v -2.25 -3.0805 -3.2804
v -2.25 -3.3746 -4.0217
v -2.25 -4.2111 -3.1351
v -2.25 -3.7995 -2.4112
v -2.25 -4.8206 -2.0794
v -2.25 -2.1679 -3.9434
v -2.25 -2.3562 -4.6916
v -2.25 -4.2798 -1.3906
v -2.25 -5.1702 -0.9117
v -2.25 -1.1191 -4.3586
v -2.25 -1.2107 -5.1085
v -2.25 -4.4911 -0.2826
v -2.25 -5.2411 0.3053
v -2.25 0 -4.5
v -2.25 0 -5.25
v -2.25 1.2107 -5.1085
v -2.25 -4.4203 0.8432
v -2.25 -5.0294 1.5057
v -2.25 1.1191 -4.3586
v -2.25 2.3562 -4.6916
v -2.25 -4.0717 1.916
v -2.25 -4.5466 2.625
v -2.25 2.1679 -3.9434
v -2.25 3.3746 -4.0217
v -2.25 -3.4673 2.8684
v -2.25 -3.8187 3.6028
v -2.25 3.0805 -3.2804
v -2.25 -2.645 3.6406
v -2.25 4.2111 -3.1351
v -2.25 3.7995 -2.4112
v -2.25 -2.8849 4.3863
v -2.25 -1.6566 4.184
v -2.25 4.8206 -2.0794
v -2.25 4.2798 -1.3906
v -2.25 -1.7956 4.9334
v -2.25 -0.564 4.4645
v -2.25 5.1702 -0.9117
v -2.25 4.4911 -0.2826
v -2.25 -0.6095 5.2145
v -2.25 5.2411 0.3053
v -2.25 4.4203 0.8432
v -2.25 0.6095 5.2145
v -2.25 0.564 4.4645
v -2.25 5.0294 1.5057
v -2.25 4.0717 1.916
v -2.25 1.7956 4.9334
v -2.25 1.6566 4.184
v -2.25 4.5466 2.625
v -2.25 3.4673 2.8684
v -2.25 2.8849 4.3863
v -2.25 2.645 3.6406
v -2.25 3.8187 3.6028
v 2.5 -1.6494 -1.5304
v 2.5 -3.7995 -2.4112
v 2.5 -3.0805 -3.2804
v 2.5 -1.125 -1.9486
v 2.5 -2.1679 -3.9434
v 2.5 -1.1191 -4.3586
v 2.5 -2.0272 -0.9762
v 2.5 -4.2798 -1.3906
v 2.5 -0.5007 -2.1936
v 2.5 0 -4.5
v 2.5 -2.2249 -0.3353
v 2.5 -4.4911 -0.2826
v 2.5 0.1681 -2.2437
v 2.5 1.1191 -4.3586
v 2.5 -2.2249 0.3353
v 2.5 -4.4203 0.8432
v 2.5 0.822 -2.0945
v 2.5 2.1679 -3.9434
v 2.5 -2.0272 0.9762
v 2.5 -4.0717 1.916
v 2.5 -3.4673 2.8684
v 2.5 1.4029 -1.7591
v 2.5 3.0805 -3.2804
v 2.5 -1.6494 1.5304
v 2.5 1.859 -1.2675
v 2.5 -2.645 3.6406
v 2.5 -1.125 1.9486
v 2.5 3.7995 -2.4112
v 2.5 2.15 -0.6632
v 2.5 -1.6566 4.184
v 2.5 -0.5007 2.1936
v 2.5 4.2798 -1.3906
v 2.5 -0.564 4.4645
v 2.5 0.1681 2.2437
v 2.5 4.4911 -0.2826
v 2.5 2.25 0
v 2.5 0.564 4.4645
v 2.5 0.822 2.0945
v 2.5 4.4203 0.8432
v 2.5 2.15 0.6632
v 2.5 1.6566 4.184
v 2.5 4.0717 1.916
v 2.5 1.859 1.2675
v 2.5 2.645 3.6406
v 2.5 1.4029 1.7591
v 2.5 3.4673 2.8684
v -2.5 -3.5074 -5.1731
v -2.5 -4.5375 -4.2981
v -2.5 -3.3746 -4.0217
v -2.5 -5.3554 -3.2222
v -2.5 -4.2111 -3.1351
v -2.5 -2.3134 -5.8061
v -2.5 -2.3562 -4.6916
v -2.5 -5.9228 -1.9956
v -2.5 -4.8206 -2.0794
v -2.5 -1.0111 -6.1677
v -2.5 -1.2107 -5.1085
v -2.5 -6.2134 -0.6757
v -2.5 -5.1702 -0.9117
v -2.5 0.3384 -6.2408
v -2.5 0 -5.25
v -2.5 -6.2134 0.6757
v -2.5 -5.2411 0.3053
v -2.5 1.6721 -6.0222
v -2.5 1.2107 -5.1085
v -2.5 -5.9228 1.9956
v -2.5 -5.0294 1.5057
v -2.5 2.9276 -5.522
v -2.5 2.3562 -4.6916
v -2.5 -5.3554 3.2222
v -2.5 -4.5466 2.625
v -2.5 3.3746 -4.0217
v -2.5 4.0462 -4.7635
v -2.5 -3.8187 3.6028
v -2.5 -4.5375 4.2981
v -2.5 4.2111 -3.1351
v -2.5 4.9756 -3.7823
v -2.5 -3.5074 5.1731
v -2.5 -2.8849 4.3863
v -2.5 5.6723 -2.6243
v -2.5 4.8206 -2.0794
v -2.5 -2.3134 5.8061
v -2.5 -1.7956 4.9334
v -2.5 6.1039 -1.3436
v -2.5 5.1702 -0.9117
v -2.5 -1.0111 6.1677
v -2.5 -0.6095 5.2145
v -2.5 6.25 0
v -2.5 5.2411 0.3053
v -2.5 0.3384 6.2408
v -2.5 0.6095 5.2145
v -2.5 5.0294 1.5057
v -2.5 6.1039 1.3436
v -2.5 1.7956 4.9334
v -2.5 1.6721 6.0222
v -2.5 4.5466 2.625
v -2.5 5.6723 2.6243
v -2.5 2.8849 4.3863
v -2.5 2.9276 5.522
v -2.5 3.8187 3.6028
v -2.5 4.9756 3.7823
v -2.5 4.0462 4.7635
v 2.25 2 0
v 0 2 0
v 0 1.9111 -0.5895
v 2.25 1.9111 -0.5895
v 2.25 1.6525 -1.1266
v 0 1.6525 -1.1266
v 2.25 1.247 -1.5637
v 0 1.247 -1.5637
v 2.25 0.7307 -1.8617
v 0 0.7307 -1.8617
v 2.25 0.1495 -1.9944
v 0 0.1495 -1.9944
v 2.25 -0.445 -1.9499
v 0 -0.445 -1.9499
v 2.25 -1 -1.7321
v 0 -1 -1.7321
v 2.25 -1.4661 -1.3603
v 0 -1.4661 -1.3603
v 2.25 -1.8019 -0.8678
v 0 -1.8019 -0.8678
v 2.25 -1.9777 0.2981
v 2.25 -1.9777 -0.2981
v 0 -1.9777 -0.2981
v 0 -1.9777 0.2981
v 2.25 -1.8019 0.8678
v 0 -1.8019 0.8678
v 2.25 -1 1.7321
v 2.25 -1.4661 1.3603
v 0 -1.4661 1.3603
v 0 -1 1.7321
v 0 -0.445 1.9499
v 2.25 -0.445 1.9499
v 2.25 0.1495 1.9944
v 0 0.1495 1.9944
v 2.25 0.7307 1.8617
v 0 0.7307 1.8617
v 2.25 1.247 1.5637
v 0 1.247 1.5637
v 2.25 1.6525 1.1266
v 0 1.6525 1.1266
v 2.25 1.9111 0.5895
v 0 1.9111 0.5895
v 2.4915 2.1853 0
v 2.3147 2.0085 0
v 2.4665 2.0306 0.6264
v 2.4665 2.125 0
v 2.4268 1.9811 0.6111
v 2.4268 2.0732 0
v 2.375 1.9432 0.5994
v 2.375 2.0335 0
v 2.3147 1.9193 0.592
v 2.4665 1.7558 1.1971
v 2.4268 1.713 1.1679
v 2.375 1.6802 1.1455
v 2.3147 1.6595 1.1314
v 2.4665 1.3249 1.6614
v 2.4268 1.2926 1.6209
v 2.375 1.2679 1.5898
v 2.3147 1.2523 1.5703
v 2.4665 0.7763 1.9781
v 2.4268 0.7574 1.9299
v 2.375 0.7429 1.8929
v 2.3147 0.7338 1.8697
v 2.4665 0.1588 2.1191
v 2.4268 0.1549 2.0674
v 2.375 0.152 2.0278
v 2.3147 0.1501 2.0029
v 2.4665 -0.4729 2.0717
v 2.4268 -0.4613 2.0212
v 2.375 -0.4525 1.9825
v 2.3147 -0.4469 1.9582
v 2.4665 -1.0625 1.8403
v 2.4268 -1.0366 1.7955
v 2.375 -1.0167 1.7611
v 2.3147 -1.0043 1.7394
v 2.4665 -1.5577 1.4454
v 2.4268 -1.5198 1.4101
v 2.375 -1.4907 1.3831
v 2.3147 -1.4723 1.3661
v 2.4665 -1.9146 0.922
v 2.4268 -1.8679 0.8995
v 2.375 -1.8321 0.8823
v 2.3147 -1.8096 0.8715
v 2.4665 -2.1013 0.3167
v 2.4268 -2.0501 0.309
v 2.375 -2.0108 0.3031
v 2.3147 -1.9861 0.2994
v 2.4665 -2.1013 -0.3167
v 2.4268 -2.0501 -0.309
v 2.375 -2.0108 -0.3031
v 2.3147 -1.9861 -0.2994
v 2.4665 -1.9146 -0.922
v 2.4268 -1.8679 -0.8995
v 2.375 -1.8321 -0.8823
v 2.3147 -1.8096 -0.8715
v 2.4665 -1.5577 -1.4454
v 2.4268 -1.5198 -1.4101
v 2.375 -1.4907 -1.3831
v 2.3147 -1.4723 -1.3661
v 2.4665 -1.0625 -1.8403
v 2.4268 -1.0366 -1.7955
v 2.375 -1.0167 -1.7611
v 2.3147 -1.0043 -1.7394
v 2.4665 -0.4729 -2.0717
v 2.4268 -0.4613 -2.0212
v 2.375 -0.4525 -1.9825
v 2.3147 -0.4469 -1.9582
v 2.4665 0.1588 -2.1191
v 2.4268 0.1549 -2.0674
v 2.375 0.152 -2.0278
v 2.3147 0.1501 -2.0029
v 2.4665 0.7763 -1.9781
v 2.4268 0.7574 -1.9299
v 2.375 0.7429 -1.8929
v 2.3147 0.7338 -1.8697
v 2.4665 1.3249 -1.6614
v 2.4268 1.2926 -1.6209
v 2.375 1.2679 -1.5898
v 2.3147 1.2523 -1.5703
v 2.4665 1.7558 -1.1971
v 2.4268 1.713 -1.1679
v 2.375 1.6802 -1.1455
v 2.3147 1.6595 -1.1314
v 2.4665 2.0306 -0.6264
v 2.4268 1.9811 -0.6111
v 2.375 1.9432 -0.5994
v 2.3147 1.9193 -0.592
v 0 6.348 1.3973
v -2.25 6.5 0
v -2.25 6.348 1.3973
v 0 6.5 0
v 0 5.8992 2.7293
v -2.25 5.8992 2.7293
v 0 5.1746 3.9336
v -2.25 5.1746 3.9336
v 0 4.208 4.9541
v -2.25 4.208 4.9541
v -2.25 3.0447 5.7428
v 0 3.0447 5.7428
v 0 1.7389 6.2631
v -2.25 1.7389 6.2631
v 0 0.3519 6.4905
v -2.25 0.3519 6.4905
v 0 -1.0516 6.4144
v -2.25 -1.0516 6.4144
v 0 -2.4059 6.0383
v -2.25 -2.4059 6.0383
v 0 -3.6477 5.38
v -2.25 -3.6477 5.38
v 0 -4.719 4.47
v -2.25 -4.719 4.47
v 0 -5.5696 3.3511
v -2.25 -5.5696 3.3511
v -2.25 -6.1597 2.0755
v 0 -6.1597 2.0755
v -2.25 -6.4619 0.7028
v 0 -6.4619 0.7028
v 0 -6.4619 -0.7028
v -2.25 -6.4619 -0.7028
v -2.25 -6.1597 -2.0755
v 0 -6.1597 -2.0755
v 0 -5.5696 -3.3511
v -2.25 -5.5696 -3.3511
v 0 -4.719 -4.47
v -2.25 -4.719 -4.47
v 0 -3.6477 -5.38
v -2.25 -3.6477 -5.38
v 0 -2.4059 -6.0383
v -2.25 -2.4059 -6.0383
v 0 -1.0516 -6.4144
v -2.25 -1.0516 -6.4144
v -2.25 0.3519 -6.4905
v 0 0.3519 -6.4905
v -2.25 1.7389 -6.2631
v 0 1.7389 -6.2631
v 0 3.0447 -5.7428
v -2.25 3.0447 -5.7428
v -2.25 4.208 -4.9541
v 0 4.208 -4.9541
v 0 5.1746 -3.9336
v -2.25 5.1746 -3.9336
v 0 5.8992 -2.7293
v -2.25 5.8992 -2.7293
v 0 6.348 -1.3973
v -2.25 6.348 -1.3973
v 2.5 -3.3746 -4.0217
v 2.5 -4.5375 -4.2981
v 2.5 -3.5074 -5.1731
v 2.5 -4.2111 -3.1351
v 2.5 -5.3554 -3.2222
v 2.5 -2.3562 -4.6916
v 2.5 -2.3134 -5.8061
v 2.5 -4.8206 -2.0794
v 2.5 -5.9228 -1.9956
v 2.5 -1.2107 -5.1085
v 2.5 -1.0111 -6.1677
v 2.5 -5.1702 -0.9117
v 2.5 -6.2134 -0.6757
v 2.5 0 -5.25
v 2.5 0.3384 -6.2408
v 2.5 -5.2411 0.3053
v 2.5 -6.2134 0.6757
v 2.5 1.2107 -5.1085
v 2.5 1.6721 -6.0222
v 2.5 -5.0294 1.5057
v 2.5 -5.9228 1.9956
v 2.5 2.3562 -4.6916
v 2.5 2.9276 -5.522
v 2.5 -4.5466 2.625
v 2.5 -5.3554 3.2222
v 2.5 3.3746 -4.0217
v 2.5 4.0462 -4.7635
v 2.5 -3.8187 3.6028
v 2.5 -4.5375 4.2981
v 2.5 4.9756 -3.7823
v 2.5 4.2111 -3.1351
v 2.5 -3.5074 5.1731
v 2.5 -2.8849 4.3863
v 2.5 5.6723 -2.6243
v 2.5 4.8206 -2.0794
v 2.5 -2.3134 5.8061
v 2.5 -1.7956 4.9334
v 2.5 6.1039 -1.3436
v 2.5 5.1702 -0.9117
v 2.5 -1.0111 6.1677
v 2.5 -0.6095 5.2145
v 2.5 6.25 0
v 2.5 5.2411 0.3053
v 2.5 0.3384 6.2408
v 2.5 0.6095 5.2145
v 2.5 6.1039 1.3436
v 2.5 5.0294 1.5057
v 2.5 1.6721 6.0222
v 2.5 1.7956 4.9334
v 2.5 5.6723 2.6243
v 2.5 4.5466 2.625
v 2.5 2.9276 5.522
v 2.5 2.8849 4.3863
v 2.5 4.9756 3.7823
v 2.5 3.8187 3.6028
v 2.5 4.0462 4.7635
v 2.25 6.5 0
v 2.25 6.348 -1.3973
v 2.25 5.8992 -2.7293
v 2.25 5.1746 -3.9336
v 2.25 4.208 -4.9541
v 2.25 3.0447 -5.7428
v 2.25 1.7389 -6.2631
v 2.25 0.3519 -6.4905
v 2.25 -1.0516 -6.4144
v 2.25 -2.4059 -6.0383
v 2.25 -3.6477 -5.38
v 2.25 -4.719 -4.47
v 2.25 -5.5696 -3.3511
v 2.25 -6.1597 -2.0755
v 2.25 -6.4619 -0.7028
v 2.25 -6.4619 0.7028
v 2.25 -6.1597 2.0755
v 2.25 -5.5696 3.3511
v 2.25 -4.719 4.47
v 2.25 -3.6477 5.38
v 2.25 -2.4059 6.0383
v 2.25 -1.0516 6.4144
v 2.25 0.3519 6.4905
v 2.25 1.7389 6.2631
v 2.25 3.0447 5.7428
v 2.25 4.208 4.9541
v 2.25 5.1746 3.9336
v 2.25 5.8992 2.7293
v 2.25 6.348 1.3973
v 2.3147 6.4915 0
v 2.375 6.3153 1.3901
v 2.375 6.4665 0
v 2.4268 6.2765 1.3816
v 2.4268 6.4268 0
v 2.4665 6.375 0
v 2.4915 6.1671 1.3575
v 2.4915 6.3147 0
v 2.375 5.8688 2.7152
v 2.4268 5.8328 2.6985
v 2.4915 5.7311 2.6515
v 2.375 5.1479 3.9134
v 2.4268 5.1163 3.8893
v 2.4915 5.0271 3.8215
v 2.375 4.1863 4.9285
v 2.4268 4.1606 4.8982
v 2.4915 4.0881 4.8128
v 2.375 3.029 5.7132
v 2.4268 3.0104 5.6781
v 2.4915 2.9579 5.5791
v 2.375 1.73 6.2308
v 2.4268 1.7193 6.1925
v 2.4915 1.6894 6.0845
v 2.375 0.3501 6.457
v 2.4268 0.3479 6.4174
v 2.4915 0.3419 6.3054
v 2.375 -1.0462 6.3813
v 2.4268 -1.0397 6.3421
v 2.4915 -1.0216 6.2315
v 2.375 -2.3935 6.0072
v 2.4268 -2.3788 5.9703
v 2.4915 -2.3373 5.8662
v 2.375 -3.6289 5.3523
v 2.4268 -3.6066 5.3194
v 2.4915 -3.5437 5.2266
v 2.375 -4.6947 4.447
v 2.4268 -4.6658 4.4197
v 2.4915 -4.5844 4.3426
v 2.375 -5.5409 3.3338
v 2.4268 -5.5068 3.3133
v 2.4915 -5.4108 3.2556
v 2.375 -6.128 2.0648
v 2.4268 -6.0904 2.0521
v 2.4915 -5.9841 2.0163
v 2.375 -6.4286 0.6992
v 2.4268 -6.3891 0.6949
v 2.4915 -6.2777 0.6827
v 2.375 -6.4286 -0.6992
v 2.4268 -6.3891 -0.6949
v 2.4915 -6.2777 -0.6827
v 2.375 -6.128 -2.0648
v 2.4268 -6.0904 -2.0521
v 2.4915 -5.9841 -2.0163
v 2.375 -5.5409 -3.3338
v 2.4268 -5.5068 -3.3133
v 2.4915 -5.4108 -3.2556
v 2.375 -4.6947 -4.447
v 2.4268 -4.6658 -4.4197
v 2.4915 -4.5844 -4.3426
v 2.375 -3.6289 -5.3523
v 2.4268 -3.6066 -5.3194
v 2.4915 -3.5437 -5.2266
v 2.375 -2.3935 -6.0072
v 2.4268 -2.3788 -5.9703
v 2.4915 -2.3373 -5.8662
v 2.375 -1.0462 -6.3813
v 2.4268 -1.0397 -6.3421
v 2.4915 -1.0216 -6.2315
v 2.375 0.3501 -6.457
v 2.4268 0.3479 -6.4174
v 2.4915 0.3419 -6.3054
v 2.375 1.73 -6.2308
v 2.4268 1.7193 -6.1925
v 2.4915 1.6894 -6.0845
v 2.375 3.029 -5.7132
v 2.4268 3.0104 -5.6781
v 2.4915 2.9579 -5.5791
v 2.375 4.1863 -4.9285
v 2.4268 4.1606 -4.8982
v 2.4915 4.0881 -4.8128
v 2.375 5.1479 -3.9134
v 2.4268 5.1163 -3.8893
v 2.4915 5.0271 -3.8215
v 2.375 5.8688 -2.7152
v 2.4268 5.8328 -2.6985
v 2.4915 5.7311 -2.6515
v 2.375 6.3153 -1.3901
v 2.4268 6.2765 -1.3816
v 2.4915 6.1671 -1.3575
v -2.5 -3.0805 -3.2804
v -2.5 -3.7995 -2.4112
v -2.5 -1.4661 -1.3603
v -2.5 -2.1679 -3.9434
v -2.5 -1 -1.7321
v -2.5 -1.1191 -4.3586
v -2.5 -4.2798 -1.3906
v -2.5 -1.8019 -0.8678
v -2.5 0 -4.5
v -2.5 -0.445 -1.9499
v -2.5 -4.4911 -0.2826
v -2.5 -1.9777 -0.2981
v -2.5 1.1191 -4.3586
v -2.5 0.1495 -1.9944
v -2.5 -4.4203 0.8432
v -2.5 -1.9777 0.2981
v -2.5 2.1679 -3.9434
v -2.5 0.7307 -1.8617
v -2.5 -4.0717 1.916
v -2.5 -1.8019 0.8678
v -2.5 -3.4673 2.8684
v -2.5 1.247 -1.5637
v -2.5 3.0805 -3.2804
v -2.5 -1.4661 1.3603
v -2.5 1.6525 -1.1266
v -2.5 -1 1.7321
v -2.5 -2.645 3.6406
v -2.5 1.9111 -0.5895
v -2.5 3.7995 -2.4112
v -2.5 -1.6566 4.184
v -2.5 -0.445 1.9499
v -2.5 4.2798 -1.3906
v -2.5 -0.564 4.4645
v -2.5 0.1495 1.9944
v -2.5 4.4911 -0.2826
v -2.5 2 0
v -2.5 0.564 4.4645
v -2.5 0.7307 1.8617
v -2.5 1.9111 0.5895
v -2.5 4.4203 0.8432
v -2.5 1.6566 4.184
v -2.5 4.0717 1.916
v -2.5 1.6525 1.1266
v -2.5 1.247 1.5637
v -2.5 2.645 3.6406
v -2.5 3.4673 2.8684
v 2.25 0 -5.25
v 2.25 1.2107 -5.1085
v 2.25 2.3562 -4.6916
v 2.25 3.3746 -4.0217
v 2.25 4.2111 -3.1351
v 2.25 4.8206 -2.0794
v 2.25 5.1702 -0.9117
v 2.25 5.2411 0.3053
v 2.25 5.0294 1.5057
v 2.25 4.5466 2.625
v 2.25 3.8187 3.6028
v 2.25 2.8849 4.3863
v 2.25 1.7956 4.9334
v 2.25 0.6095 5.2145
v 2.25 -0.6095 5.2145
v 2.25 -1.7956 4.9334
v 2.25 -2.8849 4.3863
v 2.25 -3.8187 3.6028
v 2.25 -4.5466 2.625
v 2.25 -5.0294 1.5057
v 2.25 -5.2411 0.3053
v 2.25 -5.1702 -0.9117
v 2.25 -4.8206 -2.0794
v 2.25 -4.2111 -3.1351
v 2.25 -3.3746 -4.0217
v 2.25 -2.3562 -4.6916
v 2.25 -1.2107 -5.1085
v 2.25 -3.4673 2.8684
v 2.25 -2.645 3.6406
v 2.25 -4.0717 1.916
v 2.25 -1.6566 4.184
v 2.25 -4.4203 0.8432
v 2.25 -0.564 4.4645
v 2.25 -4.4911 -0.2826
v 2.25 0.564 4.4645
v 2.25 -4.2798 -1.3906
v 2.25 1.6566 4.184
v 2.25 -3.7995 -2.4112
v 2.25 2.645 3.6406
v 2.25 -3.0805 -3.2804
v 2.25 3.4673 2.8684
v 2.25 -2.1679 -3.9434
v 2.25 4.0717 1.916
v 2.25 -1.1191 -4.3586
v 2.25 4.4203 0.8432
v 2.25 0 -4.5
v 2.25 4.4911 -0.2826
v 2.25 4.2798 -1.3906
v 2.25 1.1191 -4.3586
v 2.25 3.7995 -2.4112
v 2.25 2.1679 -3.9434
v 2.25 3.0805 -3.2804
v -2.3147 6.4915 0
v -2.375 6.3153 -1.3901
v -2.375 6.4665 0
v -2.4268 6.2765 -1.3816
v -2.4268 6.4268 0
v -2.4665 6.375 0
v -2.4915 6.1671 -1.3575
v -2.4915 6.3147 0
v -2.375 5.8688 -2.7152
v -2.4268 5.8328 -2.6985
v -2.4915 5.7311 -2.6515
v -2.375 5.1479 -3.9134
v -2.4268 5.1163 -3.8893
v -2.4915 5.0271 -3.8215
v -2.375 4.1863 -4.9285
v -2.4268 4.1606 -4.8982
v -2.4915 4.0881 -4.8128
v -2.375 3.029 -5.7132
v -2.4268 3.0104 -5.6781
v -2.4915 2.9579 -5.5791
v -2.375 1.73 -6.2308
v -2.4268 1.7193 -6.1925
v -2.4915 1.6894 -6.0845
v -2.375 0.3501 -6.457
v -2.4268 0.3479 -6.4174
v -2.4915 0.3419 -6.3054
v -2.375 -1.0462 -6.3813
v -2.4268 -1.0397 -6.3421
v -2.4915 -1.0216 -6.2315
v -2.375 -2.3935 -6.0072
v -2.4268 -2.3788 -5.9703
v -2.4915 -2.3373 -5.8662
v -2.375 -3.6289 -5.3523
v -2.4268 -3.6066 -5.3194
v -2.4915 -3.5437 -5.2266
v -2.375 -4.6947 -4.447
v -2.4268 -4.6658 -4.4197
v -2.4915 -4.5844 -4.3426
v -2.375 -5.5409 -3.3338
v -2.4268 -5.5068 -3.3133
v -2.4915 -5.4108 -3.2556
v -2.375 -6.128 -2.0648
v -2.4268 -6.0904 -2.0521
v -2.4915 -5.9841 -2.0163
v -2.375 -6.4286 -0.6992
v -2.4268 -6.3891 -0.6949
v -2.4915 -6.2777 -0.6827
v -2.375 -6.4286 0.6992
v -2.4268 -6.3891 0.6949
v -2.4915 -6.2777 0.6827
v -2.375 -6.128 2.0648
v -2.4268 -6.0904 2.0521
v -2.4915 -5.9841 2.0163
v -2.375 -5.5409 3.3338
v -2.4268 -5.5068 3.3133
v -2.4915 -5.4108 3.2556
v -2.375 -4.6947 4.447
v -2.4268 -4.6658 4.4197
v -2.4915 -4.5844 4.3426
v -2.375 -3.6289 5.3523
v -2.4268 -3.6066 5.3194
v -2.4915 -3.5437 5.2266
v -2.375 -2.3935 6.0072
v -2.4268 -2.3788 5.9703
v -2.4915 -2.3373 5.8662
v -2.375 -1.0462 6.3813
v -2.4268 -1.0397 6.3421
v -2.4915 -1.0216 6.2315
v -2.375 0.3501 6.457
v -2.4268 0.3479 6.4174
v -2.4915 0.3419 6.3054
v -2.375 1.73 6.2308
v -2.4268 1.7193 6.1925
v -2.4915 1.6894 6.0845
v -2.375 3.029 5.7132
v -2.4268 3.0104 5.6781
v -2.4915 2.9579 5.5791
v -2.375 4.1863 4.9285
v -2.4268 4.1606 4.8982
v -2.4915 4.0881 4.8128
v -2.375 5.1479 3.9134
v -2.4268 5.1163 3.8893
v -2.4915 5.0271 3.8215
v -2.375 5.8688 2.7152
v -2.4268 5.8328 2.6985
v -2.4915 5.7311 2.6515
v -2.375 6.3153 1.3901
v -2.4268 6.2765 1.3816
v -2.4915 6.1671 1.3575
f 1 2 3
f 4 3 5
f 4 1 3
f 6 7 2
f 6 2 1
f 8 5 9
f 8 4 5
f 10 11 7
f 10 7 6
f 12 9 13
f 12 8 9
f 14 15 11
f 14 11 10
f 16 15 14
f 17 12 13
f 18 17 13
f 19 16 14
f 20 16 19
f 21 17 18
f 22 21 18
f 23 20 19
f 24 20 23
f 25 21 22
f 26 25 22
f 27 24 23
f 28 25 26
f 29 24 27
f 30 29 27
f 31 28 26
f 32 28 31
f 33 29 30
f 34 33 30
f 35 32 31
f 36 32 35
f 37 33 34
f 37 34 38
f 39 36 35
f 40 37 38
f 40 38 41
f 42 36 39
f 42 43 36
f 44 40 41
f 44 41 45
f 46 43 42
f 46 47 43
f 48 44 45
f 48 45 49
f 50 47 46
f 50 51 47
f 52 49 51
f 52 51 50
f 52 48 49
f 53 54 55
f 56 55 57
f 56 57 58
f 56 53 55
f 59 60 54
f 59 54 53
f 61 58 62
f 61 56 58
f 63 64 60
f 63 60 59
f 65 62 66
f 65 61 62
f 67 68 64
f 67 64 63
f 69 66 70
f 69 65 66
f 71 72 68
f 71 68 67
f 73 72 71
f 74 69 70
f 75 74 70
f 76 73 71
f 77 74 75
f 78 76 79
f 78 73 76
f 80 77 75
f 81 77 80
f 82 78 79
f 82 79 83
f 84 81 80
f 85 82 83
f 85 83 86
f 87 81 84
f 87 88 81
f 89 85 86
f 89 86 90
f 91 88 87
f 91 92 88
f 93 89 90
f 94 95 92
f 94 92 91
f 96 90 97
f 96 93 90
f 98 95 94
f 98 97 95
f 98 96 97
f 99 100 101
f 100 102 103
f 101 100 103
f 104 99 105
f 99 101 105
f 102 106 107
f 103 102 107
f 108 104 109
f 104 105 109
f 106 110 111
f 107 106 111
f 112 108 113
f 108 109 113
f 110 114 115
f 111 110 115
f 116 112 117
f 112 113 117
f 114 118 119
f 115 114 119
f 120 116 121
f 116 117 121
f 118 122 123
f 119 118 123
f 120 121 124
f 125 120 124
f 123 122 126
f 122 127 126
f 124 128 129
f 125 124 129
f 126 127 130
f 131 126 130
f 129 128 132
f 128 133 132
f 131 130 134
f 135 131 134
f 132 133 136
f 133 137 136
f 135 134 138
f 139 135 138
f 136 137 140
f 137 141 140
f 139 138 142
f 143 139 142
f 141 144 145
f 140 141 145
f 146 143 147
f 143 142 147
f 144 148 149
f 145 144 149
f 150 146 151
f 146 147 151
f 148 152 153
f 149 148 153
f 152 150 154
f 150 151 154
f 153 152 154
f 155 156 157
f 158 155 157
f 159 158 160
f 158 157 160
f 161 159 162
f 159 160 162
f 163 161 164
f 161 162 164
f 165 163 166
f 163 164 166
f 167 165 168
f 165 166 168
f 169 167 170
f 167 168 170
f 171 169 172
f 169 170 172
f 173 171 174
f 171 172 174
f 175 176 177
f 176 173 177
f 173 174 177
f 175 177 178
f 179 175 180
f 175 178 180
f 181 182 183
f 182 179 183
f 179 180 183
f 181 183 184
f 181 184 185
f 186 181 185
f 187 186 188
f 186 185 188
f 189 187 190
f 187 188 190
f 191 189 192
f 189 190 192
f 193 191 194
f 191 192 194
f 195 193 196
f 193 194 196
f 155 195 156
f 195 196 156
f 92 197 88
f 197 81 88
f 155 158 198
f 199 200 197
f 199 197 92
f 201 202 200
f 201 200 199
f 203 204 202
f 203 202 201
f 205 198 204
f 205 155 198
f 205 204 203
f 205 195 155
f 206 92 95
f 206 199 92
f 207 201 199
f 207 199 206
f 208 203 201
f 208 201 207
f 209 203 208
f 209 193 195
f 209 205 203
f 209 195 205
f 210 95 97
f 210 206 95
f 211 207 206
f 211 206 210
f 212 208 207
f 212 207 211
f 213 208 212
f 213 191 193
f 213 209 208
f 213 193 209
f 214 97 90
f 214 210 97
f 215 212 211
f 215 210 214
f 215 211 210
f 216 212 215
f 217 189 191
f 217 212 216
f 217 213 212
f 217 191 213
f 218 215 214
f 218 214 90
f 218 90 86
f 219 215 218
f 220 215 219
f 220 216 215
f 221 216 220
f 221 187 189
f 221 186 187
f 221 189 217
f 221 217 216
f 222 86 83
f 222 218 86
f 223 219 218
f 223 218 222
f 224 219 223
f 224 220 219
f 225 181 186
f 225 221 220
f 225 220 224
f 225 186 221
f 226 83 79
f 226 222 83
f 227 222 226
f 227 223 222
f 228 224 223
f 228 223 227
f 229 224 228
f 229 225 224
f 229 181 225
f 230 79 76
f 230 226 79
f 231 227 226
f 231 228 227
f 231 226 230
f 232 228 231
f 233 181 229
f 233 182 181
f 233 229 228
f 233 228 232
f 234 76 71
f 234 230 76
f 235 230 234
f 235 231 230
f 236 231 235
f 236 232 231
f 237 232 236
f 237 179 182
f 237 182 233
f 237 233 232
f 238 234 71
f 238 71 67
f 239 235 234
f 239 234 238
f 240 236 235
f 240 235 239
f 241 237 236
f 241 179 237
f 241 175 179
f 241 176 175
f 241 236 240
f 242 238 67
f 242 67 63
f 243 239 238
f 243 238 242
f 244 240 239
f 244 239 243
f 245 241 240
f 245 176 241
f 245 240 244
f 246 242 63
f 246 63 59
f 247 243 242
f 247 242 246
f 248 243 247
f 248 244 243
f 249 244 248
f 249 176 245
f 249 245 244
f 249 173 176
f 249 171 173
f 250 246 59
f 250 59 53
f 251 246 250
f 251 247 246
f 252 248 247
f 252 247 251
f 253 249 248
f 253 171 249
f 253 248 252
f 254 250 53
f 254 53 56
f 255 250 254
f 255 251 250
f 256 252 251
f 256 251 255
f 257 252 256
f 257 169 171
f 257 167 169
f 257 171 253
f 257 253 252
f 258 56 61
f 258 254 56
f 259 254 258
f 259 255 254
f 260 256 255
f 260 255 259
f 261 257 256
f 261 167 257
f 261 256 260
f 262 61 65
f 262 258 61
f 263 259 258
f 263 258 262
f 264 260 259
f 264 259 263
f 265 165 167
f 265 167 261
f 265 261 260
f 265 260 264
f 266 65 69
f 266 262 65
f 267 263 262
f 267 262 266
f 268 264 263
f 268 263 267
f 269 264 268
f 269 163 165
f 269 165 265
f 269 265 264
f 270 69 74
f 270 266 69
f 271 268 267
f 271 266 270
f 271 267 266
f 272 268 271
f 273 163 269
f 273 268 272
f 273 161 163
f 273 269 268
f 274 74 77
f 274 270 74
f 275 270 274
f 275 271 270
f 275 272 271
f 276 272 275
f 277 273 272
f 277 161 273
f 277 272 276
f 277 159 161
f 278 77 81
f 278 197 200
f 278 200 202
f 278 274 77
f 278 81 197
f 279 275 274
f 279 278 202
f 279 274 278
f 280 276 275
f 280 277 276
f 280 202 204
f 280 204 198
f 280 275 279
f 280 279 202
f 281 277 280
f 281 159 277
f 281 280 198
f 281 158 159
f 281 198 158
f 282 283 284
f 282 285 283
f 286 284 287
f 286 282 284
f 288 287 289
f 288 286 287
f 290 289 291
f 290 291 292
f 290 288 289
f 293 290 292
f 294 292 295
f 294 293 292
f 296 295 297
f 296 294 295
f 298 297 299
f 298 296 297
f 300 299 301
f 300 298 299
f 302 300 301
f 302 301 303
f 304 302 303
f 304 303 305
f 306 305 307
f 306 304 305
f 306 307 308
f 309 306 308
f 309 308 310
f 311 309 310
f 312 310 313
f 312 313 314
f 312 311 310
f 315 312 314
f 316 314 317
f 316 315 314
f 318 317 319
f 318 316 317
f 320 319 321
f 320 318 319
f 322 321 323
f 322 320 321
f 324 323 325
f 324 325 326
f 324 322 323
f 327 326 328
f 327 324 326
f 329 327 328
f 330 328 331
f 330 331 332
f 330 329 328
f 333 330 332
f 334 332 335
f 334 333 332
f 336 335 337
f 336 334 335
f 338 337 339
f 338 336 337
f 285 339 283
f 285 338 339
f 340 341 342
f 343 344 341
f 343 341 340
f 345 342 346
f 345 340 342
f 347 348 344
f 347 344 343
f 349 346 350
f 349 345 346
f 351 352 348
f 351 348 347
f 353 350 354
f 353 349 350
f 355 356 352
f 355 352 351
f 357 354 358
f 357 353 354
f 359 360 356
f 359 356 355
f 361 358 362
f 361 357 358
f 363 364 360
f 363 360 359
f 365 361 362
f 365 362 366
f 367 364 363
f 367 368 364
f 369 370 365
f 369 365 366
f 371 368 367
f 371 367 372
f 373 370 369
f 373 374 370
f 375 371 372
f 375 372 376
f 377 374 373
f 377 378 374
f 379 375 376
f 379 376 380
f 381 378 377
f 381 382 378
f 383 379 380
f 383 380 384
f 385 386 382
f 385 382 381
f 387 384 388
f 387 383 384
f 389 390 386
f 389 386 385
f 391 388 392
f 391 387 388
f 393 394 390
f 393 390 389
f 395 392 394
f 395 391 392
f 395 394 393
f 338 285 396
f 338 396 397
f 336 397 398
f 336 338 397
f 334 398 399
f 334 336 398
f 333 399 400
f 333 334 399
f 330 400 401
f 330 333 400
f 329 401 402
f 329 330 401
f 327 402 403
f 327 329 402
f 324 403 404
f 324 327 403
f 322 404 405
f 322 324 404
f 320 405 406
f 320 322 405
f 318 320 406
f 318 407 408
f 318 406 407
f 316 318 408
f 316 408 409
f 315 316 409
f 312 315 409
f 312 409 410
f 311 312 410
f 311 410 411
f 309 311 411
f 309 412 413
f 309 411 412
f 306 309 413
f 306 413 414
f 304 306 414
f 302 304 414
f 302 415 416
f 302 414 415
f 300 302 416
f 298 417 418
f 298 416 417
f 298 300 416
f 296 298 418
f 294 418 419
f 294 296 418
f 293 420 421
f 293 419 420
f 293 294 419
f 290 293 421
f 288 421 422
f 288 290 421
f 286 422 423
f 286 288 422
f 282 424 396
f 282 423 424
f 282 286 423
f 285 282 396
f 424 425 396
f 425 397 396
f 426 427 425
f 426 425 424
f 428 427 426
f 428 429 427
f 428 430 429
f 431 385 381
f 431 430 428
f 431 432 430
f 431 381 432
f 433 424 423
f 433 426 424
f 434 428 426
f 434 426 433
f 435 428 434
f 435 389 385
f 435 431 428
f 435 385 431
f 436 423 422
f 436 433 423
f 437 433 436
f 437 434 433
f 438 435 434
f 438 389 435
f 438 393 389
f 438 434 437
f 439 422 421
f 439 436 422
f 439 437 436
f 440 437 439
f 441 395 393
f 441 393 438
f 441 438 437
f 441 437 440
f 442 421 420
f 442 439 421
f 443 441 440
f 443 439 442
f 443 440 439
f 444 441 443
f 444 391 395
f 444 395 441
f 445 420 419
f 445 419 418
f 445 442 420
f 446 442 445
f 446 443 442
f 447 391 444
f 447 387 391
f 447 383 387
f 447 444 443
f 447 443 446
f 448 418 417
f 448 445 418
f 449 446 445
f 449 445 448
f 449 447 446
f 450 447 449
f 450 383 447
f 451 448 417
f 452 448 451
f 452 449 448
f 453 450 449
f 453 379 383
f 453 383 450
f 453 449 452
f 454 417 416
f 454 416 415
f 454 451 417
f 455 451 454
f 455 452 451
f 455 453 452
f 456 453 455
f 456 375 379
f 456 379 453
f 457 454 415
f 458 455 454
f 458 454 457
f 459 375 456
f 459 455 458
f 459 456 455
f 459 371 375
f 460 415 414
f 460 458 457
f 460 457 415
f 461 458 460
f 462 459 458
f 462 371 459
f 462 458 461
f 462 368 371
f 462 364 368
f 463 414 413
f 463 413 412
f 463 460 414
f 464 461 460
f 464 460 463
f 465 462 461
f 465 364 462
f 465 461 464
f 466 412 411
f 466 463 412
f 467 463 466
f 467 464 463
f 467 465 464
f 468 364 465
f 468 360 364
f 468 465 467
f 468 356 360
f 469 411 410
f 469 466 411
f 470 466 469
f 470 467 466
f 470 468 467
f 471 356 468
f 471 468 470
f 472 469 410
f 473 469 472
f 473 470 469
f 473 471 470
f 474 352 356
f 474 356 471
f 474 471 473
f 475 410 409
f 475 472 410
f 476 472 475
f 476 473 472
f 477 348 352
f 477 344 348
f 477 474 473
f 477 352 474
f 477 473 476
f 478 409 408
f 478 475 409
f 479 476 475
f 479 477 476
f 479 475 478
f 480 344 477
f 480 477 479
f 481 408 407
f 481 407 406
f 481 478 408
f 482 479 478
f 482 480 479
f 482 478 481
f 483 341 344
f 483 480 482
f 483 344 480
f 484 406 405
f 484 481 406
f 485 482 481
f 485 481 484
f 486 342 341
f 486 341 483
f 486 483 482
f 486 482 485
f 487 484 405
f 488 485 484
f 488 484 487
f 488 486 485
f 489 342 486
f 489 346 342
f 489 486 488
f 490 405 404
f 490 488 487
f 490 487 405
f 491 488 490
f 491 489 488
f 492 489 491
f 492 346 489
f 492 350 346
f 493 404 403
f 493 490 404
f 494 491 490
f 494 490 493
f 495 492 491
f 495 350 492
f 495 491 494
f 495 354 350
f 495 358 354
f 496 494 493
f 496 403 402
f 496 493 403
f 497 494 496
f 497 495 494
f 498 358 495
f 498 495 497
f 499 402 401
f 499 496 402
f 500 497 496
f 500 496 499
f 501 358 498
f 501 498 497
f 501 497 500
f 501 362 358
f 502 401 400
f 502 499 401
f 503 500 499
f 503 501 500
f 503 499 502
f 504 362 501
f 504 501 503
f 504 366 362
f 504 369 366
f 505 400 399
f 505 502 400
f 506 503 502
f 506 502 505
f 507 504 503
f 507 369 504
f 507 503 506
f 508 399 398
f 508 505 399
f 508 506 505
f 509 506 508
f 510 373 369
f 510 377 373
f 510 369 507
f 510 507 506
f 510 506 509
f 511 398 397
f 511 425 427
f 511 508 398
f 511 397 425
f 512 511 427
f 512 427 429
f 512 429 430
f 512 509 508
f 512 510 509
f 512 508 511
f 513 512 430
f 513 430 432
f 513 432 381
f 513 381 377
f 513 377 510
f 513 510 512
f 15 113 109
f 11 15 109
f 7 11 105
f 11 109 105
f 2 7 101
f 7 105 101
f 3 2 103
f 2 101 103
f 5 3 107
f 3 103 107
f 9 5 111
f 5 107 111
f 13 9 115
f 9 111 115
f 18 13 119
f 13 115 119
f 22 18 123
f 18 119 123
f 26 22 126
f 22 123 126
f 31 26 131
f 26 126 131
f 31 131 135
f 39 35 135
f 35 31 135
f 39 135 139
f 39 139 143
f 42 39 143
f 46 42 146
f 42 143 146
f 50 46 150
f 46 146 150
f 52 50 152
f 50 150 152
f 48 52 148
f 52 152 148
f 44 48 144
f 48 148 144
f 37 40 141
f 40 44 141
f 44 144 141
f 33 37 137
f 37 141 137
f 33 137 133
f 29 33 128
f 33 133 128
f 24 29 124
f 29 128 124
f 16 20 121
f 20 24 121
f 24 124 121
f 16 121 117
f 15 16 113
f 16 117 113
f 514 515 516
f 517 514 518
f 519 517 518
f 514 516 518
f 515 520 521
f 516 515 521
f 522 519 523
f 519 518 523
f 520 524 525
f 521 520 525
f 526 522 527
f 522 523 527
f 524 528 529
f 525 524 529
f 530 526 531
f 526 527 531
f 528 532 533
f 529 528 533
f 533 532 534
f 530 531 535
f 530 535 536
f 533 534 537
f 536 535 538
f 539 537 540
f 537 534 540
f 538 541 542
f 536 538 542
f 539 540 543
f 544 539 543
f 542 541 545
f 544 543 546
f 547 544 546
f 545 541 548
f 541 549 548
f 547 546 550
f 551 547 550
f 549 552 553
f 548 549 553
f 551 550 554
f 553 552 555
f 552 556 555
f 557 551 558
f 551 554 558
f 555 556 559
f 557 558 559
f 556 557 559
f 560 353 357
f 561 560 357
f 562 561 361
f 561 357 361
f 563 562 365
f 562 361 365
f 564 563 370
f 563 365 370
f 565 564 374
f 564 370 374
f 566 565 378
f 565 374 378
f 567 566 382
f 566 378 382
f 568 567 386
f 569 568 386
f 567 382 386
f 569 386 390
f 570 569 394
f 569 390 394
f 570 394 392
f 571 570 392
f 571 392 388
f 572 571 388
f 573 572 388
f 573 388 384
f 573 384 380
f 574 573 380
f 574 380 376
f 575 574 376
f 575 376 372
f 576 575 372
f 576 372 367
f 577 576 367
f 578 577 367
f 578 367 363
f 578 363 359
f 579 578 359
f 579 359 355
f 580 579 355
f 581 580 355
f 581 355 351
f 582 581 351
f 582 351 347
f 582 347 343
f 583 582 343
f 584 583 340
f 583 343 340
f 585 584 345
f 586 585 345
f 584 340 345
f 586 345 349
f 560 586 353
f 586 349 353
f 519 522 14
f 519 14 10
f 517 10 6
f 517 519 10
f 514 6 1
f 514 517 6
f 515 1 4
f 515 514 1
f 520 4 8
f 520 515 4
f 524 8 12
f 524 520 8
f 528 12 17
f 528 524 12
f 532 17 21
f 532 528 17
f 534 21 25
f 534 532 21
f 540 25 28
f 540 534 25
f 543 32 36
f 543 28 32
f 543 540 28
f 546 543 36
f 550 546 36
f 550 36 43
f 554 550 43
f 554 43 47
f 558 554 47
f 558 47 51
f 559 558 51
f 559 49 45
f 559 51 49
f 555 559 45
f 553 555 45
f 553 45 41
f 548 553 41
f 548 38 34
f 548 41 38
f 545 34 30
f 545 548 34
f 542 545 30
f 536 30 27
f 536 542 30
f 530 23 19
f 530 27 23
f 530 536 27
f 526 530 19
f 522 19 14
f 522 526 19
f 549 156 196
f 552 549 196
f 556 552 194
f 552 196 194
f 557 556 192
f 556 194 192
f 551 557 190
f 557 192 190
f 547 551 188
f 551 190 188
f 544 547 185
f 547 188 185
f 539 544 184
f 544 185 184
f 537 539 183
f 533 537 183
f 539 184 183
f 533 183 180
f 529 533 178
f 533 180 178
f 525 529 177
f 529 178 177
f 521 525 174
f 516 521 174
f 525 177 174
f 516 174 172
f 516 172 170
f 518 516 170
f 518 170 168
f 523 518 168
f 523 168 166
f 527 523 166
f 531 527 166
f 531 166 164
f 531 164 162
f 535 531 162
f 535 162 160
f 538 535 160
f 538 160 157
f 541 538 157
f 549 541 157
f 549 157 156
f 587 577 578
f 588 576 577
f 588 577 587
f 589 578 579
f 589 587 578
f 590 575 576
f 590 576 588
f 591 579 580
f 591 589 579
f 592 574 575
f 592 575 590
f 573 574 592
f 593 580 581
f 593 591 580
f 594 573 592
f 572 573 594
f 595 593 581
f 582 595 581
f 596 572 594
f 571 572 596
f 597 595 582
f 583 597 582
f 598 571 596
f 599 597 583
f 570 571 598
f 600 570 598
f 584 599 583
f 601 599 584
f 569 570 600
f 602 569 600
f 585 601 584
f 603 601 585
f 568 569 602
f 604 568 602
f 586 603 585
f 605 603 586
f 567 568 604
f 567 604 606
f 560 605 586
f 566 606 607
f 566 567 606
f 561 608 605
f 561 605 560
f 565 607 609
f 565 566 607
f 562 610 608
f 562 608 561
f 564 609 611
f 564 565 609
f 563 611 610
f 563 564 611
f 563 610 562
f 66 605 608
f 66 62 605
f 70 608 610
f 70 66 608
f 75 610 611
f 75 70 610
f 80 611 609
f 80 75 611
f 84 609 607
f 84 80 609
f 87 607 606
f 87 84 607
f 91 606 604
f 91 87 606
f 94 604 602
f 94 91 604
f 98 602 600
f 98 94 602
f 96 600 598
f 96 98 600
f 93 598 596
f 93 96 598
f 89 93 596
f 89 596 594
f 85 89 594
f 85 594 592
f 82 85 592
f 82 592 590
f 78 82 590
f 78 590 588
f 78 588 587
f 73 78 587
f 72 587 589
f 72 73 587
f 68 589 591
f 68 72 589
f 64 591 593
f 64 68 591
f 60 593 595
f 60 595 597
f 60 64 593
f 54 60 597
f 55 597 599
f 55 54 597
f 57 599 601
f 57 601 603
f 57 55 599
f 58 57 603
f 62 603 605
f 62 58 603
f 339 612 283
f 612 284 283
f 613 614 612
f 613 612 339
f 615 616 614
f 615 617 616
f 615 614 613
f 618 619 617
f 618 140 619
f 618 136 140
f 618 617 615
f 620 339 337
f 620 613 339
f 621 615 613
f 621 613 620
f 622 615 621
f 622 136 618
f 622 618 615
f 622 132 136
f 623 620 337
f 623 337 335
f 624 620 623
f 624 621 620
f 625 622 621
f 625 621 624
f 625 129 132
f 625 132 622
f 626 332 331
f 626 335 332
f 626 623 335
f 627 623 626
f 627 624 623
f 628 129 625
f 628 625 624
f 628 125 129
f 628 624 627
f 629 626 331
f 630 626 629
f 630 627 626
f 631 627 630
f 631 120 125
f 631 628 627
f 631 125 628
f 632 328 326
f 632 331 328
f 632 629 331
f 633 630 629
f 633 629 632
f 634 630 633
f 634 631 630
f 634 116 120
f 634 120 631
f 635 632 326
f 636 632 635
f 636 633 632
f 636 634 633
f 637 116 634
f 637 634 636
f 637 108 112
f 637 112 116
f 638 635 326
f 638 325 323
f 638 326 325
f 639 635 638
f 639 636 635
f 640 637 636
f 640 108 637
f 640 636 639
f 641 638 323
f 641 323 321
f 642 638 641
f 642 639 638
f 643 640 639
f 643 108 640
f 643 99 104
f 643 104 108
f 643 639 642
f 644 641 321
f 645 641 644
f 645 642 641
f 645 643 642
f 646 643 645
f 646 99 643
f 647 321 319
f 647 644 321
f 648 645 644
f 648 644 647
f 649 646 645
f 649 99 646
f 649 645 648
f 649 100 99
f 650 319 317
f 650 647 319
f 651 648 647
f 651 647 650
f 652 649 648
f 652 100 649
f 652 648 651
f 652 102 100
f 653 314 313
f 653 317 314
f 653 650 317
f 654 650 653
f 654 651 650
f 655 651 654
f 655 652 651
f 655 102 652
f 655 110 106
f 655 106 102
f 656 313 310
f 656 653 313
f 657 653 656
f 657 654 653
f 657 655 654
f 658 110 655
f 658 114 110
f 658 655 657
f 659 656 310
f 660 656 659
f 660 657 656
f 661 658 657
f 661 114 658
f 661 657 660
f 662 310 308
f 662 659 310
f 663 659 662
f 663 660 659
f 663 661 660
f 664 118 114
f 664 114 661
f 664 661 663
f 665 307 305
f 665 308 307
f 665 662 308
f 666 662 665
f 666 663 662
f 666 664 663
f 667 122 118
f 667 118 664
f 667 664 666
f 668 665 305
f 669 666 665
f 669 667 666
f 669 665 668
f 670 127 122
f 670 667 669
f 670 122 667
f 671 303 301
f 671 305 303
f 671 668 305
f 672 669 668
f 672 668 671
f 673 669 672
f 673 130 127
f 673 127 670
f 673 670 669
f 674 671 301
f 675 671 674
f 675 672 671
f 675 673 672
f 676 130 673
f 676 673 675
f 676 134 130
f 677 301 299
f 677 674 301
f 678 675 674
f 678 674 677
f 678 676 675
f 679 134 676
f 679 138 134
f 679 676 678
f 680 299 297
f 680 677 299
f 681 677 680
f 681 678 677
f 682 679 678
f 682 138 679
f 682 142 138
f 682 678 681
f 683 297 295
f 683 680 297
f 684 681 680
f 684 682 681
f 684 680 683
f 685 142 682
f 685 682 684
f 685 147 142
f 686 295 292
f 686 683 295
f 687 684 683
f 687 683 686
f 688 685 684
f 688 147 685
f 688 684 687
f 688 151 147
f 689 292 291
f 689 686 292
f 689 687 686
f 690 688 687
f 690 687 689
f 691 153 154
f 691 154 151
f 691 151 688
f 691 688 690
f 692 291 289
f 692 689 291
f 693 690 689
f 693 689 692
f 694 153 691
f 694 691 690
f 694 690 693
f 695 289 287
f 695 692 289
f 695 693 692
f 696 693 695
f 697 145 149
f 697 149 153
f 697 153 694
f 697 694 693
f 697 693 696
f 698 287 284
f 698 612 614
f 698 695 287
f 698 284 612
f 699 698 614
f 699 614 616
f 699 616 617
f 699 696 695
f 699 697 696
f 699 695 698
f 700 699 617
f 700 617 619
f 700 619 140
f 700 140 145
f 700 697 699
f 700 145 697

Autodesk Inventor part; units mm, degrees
ref_plane "YZ Plane" through (0, 0, 0) normal (1, 0, 0) x (0, 1, 0)
ref_plane "XZ Plane" through (0, 0, 0) normal (0, 1, 0) x (-1, 0, 0)
ref_plane "XY Plane" through (0, 0, 0) normal (0, 0, 1) x (1, 0, 0)
sketch "Sketch1" plane through (0, 0, 0) normal (1, 0, 0) x (0, 1, 0)
  circle A0 centre (0, 0) radius 6.5
  circle A1 centre (0, 0) radius 2
  dimension "d0" = 13
  dimension "d1" = 4
extrude "Extrusion1" add sketch "Sketch1" along normal mid plane 5
fillet "Fillet1" radius 0.25 2 edges at (2.5, -6.5, 0) (-2.5, -6.5, 0)
fillet "Fillet2" radius 0.25 1 edges at (2.5, -2, 0)
sketch "Sketch2" plane through (2.5, 0, 0) normal (1, 0, 0) x (0, 0, -1)
  circle A0 centre (0, 0) radius 5.25
  circle A1 centre (0, 0) radius 4.5
  dimension "d6" = 10.5
  dimension "d7" = 9
extrude "Extrusion2" cut sketch "Sketch2" against normal blind 0.25
mirror "Mirror1" about plane through (0, 0, 0) normal (1, 0, 0) of "Extrusion2"
properties part number "Bearing" material "Stainless Steel, Austenitic"
